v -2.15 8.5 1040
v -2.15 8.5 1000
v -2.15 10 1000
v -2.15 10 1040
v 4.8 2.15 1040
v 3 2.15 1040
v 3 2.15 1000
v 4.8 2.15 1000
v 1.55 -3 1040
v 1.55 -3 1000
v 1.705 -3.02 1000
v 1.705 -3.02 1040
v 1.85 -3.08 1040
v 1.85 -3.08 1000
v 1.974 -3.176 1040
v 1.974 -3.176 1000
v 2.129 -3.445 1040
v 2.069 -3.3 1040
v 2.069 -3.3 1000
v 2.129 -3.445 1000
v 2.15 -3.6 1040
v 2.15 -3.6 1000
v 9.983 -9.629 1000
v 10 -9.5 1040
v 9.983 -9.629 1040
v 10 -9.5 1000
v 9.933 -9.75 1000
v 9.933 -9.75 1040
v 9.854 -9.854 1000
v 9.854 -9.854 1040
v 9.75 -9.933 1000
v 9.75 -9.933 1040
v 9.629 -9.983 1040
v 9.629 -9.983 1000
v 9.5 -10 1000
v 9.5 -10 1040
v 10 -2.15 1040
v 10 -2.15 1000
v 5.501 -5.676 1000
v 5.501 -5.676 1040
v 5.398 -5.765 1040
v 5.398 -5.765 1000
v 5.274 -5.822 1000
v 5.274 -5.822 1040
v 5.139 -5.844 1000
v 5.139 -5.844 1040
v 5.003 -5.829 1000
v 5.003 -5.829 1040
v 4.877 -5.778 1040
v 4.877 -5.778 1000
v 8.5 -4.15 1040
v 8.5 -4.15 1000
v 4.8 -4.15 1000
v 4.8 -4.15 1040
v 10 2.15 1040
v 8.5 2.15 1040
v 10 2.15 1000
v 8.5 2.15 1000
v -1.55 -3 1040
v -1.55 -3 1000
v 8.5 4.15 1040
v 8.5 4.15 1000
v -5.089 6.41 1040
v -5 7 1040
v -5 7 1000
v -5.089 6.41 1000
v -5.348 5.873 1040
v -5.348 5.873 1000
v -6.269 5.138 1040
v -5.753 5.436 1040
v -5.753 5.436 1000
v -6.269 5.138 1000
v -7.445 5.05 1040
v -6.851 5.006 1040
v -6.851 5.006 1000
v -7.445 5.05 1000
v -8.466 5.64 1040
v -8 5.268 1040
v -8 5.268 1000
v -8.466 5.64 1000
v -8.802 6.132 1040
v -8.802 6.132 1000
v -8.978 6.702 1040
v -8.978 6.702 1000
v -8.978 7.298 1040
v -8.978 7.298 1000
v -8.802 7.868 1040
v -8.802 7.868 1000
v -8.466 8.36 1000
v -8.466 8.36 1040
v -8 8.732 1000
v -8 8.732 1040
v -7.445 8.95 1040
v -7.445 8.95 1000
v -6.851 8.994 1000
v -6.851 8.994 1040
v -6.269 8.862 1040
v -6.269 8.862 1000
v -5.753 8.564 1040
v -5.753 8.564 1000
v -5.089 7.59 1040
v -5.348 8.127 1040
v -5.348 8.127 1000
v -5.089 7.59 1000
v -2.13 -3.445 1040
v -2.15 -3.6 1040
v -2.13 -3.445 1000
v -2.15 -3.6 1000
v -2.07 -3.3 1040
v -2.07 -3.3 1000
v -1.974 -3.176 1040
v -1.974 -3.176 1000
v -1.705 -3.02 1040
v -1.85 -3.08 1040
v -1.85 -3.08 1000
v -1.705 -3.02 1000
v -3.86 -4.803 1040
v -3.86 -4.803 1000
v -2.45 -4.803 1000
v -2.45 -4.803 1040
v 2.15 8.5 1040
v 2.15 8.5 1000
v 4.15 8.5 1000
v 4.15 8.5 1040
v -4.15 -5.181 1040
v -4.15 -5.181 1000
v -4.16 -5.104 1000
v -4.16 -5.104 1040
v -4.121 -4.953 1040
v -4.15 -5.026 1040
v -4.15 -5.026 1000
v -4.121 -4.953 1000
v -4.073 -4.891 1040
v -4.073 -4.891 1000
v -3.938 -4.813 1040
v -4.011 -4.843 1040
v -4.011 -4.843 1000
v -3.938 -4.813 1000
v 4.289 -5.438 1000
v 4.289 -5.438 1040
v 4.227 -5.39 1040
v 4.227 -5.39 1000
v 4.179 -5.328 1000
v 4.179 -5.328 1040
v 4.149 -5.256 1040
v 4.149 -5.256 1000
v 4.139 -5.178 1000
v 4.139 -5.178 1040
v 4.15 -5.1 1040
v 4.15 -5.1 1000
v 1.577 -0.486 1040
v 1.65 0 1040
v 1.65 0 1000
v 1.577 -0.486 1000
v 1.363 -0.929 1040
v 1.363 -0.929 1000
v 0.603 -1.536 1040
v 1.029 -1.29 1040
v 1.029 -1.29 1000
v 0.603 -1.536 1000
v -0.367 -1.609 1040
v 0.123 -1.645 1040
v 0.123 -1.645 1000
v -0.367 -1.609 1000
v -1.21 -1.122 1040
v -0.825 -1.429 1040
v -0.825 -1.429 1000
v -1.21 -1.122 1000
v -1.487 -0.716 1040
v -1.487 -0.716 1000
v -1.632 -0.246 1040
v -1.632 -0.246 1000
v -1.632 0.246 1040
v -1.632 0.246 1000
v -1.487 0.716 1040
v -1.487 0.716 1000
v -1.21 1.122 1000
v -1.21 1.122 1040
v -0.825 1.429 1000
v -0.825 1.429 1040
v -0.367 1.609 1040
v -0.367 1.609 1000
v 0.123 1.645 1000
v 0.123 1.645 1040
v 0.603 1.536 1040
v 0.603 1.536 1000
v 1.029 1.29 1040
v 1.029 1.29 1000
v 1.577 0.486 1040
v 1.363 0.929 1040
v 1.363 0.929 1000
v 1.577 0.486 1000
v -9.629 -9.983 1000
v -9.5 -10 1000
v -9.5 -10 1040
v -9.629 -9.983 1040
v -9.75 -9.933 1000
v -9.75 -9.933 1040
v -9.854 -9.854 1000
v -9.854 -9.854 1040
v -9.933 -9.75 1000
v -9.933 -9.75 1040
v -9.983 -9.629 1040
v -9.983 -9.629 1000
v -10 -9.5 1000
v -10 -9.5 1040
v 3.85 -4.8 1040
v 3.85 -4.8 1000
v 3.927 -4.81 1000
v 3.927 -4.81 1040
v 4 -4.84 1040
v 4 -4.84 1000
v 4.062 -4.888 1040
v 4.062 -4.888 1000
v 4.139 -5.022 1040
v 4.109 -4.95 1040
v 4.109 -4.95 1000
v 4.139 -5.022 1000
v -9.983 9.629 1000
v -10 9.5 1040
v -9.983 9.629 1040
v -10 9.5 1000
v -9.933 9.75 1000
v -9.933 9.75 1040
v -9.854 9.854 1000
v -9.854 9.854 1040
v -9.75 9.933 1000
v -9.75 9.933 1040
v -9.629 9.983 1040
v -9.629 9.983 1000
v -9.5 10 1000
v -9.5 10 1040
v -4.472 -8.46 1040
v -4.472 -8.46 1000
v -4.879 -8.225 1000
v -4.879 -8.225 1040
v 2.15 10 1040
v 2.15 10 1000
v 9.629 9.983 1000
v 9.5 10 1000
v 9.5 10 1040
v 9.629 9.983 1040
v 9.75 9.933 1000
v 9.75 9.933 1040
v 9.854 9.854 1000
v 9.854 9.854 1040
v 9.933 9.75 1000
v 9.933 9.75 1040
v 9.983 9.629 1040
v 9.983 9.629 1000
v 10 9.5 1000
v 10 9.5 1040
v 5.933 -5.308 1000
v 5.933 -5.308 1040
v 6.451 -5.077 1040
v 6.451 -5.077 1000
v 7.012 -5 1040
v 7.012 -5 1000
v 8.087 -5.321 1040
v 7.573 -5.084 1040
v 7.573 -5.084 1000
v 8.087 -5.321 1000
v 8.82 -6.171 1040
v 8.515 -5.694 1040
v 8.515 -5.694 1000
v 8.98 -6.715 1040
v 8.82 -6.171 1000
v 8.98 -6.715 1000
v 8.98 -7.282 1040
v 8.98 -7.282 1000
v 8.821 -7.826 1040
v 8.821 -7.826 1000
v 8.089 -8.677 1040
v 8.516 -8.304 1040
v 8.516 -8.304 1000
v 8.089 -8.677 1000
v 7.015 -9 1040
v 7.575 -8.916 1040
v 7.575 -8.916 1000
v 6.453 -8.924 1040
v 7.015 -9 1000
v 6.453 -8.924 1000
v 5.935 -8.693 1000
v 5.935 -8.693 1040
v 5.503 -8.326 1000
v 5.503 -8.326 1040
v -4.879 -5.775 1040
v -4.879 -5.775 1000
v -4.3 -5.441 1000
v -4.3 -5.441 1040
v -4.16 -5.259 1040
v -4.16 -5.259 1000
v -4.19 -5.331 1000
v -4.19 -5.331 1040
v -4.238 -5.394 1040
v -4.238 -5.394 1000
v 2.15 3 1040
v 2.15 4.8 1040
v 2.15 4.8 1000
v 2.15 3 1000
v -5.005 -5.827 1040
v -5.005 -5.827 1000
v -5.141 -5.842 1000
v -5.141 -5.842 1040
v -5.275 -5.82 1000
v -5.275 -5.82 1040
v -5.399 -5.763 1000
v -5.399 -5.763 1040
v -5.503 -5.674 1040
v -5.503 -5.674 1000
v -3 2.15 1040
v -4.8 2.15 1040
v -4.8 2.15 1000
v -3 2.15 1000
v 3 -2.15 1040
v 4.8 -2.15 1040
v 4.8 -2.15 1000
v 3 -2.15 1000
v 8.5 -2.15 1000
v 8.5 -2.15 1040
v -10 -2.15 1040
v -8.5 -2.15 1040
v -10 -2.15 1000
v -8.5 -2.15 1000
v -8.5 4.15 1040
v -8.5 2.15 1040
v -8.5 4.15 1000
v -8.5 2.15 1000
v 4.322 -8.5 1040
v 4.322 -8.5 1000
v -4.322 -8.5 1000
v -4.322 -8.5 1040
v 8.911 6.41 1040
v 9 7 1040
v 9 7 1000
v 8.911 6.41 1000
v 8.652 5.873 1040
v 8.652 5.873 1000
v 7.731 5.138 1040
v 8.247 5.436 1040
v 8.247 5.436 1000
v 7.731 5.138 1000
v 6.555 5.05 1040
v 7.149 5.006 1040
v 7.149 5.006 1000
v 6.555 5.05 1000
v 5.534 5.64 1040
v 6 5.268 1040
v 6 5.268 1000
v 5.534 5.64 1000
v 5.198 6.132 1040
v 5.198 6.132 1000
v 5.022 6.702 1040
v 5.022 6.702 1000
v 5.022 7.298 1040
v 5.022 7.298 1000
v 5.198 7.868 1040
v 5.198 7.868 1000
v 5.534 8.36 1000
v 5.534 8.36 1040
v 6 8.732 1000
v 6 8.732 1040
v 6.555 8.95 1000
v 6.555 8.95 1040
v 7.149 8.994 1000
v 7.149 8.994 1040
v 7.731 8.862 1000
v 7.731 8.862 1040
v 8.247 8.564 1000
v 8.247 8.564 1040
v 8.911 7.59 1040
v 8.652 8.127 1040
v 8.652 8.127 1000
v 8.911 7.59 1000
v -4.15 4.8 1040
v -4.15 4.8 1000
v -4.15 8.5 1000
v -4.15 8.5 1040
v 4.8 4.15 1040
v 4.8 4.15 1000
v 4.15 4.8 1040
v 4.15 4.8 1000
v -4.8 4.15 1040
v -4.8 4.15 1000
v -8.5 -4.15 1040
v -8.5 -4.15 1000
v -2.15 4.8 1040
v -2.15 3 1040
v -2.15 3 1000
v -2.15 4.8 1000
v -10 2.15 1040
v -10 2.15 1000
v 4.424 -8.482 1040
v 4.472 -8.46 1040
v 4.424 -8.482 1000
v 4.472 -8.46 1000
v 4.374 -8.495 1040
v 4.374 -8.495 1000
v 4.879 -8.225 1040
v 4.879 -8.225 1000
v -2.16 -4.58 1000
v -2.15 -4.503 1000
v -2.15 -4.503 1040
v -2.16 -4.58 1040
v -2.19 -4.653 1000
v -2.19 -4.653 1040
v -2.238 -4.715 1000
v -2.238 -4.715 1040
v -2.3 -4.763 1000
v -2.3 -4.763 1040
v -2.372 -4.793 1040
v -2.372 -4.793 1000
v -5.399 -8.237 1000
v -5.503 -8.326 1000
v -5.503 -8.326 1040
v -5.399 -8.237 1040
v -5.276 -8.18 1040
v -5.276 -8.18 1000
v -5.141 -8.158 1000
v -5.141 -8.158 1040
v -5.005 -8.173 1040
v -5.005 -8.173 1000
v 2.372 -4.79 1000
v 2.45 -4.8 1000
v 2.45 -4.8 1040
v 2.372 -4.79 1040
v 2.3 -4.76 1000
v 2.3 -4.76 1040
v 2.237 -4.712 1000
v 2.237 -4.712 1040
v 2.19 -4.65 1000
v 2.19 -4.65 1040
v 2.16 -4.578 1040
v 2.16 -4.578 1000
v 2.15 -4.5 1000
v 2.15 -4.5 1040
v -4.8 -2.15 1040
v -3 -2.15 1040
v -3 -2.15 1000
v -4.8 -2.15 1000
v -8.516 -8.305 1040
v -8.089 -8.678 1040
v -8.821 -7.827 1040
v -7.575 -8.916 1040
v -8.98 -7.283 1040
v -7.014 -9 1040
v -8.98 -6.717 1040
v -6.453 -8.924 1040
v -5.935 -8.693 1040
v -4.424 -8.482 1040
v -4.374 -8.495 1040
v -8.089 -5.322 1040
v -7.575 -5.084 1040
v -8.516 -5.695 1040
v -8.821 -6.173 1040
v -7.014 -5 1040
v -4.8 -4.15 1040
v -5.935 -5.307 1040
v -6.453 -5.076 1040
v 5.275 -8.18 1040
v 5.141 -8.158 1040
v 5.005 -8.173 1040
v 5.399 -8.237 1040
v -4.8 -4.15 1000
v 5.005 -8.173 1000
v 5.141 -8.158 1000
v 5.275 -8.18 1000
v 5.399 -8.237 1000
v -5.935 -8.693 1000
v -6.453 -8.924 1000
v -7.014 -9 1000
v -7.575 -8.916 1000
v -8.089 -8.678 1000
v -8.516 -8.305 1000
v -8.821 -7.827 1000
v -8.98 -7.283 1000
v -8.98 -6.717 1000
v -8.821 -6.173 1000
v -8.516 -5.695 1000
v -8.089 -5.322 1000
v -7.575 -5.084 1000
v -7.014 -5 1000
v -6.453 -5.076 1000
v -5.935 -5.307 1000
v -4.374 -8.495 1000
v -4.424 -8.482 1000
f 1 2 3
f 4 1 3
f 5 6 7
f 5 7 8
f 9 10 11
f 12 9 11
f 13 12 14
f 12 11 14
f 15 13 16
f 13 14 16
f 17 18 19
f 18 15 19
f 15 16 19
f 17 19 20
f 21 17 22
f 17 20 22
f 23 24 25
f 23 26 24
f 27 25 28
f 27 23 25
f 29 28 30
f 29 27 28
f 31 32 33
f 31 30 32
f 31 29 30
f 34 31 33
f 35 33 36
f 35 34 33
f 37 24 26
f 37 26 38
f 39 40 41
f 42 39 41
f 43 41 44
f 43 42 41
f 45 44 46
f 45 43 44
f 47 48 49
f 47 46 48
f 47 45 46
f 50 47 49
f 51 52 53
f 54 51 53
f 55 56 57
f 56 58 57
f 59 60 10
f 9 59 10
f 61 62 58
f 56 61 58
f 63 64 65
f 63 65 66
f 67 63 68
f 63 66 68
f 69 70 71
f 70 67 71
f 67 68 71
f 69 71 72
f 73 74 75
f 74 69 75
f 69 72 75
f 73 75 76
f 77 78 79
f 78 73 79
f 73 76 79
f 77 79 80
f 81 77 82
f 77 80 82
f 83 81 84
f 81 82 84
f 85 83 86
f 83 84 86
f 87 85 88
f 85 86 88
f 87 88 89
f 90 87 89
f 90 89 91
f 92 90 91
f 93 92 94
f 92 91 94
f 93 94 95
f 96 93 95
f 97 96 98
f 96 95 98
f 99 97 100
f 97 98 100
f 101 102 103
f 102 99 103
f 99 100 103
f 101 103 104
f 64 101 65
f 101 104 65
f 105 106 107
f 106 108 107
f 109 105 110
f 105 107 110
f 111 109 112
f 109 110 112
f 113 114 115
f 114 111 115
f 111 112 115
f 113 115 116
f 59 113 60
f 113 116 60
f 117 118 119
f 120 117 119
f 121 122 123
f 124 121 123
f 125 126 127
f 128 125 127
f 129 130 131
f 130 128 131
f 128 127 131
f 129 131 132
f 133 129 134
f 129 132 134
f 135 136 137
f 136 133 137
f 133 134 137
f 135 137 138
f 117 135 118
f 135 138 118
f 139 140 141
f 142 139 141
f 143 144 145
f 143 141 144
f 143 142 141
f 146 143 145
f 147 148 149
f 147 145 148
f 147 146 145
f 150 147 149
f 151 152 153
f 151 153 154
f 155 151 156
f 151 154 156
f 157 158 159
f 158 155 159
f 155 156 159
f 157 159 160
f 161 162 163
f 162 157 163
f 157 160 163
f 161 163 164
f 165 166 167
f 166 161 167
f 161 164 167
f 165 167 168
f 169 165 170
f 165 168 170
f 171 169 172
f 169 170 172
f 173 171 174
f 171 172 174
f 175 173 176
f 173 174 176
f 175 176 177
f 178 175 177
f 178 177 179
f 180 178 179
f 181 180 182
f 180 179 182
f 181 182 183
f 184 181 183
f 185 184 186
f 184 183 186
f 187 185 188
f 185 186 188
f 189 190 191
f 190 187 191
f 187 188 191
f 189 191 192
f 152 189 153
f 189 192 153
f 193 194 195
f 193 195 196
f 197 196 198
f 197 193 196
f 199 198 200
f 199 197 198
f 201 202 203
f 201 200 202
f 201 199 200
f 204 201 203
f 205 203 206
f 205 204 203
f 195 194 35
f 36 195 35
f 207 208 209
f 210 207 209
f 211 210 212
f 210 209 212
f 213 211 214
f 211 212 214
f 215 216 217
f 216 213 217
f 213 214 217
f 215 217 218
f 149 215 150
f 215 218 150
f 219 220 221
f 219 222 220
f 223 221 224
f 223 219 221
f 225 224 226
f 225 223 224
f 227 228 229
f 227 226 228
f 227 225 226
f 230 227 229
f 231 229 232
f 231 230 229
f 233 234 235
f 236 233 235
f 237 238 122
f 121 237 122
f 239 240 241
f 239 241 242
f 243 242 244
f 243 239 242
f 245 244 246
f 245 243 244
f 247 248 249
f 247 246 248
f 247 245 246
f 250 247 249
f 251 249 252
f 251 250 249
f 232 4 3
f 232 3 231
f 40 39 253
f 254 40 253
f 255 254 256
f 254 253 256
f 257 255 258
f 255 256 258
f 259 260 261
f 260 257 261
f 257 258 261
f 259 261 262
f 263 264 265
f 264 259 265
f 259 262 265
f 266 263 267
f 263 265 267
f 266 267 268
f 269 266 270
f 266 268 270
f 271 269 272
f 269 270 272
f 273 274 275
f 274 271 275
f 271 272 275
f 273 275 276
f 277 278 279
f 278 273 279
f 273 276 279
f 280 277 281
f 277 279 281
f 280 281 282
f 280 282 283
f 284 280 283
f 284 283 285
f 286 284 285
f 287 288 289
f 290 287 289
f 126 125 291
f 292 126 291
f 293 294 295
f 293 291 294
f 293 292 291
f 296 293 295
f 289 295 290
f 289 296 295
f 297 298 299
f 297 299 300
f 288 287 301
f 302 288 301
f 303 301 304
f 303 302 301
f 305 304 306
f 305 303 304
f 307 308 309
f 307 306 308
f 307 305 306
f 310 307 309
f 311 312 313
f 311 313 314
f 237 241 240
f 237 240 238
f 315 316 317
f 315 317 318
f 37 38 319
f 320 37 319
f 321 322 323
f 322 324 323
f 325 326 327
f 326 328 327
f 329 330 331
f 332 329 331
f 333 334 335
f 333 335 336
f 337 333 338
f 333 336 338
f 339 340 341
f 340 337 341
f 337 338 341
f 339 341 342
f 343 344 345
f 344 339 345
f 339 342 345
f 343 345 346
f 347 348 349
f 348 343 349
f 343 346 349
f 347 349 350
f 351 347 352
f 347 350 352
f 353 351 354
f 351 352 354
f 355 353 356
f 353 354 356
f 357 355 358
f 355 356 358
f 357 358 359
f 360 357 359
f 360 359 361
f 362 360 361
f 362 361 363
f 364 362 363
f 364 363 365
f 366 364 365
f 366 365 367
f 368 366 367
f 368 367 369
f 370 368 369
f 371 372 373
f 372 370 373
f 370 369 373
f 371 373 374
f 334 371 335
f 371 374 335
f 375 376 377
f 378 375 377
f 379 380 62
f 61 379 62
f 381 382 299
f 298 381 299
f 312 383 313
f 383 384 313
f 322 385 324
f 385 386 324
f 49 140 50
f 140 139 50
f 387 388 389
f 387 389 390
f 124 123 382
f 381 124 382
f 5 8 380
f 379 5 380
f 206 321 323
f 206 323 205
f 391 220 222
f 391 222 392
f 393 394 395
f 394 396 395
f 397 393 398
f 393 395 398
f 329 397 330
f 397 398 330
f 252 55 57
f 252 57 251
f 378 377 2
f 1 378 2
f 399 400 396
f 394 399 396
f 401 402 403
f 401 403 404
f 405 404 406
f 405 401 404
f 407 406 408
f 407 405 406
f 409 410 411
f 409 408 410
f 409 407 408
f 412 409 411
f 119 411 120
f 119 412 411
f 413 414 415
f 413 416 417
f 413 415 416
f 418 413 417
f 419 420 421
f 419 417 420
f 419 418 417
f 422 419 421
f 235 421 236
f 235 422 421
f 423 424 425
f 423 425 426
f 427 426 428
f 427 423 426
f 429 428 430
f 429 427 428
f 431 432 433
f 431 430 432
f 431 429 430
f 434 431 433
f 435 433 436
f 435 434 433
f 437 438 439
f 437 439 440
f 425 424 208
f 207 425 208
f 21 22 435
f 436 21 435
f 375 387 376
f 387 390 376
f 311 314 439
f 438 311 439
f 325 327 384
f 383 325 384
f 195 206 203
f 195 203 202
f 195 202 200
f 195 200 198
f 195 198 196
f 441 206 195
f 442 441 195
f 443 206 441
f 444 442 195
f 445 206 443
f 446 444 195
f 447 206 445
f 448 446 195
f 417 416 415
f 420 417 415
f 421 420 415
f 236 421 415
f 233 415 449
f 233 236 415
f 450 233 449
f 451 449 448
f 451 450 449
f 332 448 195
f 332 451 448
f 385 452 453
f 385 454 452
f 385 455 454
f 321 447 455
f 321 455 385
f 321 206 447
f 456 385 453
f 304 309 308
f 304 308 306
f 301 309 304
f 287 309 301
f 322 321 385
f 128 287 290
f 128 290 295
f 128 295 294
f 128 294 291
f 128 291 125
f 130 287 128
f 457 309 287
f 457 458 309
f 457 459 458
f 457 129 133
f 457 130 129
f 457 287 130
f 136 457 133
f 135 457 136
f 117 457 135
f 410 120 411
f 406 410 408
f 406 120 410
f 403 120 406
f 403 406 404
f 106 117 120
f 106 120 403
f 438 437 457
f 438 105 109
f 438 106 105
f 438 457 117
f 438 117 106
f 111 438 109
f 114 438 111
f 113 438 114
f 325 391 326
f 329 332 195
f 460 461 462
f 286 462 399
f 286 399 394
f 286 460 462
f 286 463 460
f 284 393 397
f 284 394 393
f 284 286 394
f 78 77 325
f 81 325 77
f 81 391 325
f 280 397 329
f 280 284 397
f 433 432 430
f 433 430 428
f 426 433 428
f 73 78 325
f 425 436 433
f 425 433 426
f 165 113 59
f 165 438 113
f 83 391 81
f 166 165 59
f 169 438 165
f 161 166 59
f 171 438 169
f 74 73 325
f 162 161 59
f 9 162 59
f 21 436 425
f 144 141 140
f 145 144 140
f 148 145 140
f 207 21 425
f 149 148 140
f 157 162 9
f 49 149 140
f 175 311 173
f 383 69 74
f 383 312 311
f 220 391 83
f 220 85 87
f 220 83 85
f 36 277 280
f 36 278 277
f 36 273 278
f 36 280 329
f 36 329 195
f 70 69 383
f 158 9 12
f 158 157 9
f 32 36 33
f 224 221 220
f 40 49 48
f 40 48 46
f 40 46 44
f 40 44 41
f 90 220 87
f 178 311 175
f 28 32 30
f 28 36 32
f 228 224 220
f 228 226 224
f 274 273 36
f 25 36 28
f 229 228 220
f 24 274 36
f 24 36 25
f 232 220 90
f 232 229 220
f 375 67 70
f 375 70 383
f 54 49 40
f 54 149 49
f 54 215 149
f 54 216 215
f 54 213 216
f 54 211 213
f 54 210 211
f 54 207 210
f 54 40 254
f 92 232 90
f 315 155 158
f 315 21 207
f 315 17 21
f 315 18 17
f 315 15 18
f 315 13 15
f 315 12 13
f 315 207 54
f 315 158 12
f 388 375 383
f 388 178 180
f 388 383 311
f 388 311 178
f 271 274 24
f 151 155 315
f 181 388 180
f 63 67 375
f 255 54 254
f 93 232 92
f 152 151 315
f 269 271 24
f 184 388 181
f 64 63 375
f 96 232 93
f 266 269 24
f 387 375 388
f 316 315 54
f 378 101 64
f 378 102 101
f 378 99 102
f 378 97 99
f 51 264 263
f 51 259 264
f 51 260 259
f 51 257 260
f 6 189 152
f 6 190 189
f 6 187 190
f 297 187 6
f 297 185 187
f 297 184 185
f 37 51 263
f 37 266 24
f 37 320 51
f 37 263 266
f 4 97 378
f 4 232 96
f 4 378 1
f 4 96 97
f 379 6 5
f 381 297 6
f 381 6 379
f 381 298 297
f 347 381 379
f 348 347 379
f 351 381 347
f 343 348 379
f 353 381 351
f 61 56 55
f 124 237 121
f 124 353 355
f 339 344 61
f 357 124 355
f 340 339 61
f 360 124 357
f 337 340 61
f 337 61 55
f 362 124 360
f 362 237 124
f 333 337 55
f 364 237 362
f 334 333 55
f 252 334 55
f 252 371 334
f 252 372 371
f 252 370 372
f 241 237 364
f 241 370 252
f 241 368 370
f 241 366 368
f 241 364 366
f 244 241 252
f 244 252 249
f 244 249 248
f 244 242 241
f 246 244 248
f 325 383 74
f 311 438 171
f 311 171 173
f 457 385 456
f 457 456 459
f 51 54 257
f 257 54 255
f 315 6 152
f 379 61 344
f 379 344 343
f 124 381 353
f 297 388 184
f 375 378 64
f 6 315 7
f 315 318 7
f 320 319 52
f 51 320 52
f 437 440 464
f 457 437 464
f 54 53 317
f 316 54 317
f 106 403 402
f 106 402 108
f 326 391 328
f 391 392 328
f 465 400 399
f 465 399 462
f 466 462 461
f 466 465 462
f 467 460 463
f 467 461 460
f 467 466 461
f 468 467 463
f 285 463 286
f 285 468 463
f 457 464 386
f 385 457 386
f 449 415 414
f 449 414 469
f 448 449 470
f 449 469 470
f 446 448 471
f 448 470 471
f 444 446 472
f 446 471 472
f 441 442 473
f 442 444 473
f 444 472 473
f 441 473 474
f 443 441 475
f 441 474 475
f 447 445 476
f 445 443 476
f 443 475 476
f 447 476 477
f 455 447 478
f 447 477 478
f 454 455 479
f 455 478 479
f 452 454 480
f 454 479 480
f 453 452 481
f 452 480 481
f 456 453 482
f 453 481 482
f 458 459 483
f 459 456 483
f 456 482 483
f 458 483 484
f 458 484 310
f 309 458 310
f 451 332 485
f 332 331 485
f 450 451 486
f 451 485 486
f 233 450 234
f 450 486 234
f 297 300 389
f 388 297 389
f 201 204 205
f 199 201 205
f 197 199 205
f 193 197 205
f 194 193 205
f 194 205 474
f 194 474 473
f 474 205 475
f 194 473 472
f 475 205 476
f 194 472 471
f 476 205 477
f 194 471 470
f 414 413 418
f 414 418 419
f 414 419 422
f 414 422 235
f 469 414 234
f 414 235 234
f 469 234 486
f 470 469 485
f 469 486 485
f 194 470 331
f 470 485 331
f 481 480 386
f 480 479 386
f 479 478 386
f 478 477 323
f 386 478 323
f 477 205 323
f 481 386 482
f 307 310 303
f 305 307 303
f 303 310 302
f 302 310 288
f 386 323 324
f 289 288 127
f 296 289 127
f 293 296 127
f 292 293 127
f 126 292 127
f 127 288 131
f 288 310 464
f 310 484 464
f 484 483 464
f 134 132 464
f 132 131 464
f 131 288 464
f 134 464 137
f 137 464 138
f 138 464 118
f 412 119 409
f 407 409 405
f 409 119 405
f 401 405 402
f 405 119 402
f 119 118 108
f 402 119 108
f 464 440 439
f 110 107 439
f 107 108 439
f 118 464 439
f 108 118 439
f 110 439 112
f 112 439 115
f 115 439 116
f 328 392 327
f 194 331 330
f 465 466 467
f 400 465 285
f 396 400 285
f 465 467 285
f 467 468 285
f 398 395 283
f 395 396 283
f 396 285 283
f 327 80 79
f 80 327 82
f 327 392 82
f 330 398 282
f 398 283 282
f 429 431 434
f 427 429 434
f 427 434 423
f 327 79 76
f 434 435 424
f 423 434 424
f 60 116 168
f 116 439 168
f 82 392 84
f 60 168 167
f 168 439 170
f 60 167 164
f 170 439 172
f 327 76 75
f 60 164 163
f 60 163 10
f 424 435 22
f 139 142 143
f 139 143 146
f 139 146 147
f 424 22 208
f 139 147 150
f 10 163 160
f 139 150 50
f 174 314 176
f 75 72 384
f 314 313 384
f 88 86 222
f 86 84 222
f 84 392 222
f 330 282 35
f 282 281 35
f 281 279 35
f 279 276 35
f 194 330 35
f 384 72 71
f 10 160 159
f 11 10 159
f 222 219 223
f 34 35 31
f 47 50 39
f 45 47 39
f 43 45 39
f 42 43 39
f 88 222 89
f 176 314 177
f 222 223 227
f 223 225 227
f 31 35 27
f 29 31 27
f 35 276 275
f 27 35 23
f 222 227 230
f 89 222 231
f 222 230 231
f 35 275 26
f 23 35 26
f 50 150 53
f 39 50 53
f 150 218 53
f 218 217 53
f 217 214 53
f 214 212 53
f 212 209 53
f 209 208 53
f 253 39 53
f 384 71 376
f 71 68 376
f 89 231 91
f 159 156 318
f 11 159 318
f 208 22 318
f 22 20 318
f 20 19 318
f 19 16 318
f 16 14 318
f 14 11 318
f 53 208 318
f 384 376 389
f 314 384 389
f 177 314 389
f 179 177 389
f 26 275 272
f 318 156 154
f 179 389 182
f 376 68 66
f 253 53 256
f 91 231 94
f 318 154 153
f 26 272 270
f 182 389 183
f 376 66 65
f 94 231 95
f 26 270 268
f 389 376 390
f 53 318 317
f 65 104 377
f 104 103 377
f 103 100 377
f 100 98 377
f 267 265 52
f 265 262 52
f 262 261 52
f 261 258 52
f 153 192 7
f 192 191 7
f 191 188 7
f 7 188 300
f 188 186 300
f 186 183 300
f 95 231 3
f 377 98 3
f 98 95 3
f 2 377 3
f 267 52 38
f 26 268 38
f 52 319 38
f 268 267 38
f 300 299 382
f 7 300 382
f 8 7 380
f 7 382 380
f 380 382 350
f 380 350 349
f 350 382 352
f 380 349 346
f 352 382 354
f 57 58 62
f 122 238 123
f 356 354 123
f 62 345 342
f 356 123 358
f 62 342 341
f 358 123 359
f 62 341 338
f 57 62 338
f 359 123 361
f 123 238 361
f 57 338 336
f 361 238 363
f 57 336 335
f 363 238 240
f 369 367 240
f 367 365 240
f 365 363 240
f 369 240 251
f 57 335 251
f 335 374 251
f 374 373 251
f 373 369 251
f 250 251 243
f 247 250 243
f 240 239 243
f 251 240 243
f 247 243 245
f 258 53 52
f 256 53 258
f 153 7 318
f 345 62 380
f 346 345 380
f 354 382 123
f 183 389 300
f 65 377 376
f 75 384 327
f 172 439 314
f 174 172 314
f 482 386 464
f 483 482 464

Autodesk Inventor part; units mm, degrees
ref_plane "YZ Plane" through (0, 0, 0) normal (1, 0, 0) x (0, 1, 0)
ref_plane "XZ Plane" through (0, 0, 0) normal (0, 1, 0) x (-1, 0, 0)
ref_plane "作業平面1" through (-9.5, -10, 1000) normal (0, 0, 1) x (1, 0, 0)
sketch "スケッチ1" plane through (-9.5, -10, 1000) normal (0, 0, 1) x (1, 0, 0)
  line L0 (7.35, 18.5) -> (7.35, 20) projected
  line L1 (7.35, 20) -> (0, 20) projected
  arc A0 (0, 20) -> (-0.5, 19.5) centre (0, 19.5) ccw projected
  line L2 (-0.5, 19.5) -> (-0.5, 12.15) projected
  line L3 (-0.5, 12.15) -> (1, 12.15) projected
  line L4 (1, 12.15) -> (1, 14.15) projected
  line L5 (1, 14.15) -> (4.7, 14.15) projected
  line L6 (4.7, 14.15) -> (4.7, 12.15) projected
  line L7 (4.7, 12.15) -> (6.5, 12.15) projected
  line L8 (6.5, 12.15) -> (6.5, 7.85) projected
  line L9 (6.5, 7.85) -> (4.7, 7.85) projected
  line L10 (4.7, 7.85) -> (4.7, 5.85) projected
  line L11 (4.7, 5.85) -> (1, 5.85) projected
  line L12 (1, 5.85) -> (1, 7.85) projected
  line L13 (1, 7.85) -> (-0.5, 7.85) projected
  line L14 (-0.5, 7.85) -> (-0.5, 0.5) projected
  arc A1 (-0.5, 0.5) -> (0, 0) centre (0, 0.5) ccw projected
  line L15 (0, 0) -> (19, 0) projected
  arc A2 (19, 0) -> (19.5, 0.5) centre (19, 0.5) ccw projected
  line L16 (19.5, 0.5) -> (19.5, 7.85) projected
  line L17 (19.5, 7.85) -> (18, 7.85) projected
  line L18 (18, 7.85) -> (18, 5.85) projected
  line L19 (18, 5.85) -> (14.3, 5.85) projected
  line L20 (14.3, 5.85) -> (14.3, 7.85) projected
  line L21 (14.3, 7.85) -> (12.5, 7.85) projected
  line L22 (12.5, 7.85) -> (12.5, 12.15) projected
  line L23 (12.5, 12.15) -> (14.3, 12.15) projected
  line L24 (14.3, 12.15) -> (14.3, 14.15) projected
  line L25 (14.3, 14.15) -> (18, 14.15) projected
  line L26 (18, 14.15) -> (18, 12.15) projected
  line L27 (18, 12.15) -> (19.5, 12.15) projected
  line L28 (19.5, 12.15) -> (19.5, 19.5) projected
  arc A3 (19.5, 19.5) -> (19, 20) centre (19, 19.5) ccw projected
  line L29 (19, 20) -> (11.65, 20) projected
  line L30 (11.65, 20) -> (11.65, 18.5) projected
  line L31 (11.65, 18.5) -> (13.65, 18.5) projected
  line L32 (13.65, 18.5) -> (13.65, 14.8) projected
  line L33 (13.65, 14.8) -> (11.65, 14.8) projected
  line L34 (11.65, 14.8) -> (11.65, 13) projected
  line L35 (11.65, 13) -> (7.35, 13) projected
  line L36 (7.35, 13) -> (7.35, 14.8) projected
  line L37 (7.35, 14.8) -> (5.35, 14.8) projected
  line L38 (5.35, 14.8) -> (5.35, 18.5) projected
  line L39 (5.35, 18.5) -> (7.35, 18.5) projected
  arc A4 (11.6496, 6.4) -> (11.0496, 7) centre (11.0496, 6.4) ccw projected
  line L40 (11.6496, 6.4) -> (11.6496, 5.5) projected
  arc A5 (11.6496, 5.5) -> (11.9496, 5.2) centre (11.9496, 5.5) ccw projected
  line L41 (11.9496, 5.2) -> (13.3496, 5.2) projected
  arc A6 (13.6496, 4.9) -> (13.3496, 5.2) centre (13.3496, 4.9) ccw projected
  arc A7 (13.6496, 4.9) -> (13.7891, 4.5617) centre (13.9391, 4.8215) ccw projected
  line L42 (13.7891, 4.5617) -> (14.3769, 4.2223) projected
  arc A8 (14.3769, 4.2223) -> (15.0013, 4.3244) centre (14.6267, 4.6555) ccw projected
  arc A9 (15.0029, 1.6738) -> (15.0013, 4.3244) centre (16.5, 3) ccw projected
  arc A10 (15.0029, 1.6738) -> (14.3787, 1.7753) centre (14.6287, 1.3422) ccw projected
  line L43 (14.3787, 1.7753) -> (13.9715, 1.5402) projected
  arc A11 (13.8215, 1.5) -> (13.9715, 1.5402) centre (13.8215, 1.8) ccw projected
  line L44 (13.8215, 1.5) -> (5.1785, 1.5) projected
  arc A12 (5.0285, 1.5402) -> (5.1785, 1.5) centre (5.1785, 1.8) ccw projected
  line L45 (5.0285, 1.5402) -> (4.6213, 1.7753) projected
  arc A13 (4.6213, 1.7753) -> (3.9971, 1.6738) centre (4.3713, 1.3422) ccw projected
  arc A14 (3.9971, 4.3262) -> (3.9971, 1.6738) centre (2.5, 3) ccw projected
  arc A15 (3.9971, 4.3262) -> (4.6213, 4.2247) centre (4.3713, 4.6578) ccw projected
  line L46 (4.6213, 4.2247) -> (5.2, 4.5588) projected
  arc A16 (5.2, 4.5588) -> (5.35, 4.8187) centre (5.05, 4.8187) ccw projected
  arc A17 (5.6395, 5.1972) -> (5.35, 4.8187) centre (5.6395, 4.8972) ccw projected
  line L47 (5.6395, 5.1972) -> (7.05, 5.1972) projected
  arc A18 (7.05, 5.1972) -> (7.35, 5.4972) centre (7.05, 5.4972) ccw projected
  line L48 (7.35, 5.4972) -> (7.35, 6.4) projected
  arc A19 (7.95, 7) -> (7.35, 6.4) centre (7.95, 6.4) ccw projected
  line L49 (7.95, 7) -> (11.0496, 7) projected
  circle A20 centre (2.5, 17) radius 2 projected
  circle A21 centre (16.5, 17) radius 2 projected
  circle A22 centre (9.5, 10) radius 1.65 projected
  point P0 (9.5, 10)
extrude "押し出し1" add sketch "スケッチ1" along normal blind 40
properties part number "AFSF-2020-4"
